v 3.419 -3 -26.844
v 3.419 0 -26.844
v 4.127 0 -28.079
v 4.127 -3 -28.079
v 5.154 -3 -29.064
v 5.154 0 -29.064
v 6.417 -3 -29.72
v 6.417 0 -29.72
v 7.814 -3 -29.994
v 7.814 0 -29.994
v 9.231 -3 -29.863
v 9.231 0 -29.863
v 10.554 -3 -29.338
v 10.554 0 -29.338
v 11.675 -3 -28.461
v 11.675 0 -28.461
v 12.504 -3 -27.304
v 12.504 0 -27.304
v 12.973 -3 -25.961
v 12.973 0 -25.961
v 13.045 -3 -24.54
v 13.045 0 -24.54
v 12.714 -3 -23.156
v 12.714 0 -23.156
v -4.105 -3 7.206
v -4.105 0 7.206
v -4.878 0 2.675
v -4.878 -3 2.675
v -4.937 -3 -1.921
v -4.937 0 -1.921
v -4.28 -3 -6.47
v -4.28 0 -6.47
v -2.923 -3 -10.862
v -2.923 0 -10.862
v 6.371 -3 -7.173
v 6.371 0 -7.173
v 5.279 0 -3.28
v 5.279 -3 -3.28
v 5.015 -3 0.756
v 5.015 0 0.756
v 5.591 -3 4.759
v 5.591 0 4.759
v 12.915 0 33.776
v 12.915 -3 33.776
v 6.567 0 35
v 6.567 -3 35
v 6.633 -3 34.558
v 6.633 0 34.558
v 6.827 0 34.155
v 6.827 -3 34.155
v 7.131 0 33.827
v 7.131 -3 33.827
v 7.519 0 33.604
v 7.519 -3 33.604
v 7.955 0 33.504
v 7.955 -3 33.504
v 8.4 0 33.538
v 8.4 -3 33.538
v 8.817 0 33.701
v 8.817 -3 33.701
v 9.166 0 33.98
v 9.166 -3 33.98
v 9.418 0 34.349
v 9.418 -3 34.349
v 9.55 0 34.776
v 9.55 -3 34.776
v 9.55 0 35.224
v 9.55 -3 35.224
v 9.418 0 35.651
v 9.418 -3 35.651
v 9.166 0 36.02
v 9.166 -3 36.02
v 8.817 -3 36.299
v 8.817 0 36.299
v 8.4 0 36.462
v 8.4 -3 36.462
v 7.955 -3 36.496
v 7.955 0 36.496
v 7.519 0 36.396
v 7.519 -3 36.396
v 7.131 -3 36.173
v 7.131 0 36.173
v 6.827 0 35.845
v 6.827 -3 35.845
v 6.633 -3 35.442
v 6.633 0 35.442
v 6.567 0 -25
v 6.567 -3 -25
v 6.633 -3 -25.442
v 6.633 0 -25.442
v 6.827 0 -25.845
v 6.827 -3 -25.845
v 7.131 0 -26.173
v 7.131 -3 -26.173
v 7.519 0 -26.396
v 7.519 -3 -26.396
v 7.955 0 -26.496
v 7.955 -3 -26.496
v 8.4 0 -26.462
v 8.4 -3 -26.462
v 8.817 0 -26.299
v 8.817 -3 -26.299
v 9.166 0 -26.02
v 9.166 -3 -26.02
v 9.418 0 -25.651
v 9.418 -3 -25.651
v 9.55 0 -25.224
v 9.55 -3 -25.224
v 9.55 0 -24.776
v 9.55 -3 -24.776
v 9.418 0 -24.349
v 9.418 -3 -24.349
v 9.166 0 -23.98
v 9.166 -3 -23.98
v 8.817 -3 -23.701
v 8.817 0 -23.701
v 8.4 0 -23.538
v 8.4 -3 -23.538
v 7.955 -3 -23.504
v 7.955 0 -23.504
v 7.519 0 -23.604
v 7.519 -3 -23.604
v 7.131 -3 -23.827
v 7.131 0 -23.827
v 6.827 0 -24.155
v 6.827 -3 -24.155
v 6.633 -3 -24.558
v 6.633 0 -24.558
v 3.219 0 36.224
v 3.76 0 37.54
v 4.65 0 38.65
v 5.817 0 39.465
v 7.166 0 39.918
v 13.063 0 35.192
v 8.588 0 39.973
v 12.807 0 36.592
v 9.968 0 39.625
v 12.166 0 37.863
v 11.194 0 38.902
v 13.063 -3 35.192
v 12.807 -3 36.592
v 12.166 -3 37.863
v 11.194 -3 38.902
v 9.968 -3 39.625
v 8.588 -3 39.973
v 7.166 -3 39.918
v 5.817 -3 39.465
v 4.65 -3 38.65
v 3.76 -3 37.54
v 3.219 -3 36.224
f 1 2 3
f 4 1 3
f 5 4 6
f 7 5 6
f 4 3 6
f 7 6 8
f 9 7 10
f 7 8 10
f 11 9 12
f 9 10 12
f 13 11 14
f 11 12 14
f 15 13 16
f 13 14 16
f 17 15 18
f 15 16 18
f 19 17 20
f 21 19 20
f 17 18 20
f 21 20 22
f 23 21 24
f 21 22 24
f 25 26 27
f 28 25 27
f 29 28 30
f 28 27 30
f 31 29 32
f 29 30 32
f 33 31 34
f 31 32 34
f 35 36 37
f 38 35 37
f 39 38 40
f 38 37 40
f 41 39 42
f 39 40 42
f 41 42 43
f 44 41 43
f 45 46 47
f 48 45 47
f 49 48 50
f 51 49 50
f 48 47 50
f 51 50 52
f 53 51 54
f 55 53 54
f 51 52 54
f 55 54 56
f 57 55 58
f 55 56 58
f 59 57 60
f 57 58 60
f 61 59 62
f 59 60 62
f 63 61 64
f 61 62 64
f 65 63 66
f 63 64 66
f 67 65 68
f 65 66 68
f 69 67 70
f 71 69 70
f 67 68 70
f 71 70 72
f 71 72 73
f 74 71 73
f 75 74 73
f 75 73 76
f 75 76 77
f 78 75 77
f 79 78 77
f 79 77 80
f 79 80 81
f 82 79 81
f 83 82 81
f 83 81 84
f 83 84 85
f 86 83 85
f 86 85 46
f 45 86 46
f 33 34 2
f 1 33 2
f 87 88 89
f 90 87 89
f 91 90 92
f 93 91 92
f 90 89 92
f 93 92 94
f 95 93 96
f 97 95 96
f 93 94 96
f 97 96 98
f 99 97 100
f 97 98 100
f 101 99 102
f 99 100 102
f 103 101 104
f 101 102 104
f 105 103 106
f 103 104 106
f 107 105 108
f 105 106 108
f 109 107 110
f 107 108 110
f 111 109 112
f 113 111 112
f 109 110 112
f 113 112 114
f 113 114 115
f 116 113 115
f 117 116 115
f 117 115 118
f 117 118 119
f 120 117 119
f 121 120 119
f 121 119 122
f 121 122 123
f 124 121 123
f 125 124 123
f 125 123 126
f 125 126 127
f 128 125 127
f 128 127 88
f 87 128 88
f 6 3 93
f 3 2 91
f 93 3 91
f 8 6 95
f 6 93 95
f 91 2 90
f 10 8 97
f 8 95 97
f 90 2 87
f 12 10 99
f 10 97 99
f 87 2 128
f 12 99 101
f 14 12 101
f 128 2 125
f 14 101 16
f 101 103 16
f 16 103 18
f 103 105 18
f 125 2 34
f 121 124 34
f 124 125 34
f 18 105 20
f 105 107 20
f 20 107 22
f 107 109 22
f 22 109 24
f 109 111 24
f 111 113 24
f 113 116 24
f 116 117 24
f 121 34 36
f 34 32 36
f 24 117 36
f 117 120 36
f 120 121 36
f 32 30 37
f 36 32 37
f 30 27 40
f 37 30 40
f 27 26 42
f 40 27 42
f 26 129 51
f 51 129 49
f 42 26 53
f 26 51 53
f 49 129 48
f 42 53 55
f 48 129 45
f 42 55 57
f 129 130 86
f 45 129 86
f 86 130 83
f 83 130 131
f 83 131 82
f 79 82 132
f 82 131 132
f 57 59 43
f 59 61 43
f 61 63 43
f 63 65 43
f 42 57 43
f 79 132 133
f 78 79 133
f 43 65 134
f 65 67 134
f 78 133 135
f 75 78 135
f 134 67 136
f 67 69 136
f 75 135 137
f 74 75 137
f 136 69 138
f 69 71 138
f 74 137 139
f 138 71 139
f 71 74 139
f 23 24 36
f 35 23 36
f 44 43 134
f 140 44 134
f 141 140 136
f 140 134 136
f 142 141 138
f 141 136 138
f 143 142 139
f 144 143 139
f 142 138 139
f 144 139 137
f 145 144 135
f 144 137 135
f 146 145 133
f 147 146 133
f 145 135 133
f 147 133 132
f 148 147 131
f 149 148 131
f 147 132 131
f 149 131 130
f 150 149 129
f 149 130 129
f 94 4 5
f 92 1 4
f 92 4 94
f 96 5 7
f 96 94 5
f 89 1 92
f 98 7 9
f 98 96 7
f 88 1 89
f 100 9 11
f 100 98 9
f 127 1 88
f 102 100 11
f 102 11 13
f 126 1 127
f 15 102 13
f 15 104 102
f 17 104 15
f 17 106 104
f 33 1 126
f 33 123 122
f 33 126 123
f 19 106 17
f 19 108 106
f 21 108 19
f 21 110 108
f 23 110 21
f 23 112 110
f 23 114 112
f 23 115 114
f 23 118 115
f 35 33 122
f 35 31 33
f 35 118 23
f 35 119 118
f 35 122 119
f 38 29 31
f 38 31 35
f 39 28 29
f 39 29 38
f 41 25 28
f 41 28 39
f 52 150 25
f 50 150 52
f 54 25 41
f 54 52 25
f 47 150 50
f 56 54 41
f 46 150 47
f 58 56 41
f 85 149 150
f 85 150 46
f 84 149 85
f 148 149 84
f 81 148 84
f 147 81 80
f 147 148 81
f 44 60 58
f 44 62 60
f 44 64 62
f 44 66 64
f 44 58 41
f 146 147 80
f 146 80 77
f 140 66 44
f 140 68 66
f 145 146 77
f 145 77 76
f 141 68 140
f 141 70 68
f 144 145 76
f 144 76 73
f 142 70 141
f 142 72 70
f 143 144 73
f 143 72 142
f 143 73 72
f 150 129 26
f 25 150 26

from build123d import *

# Parameters (mm, degrees)
F1_DEPTH = 3
F2_D     = 3


# Not quite as in the source:
# - a feature of the source that left no trace in its solid (it failed there, or was rolled back) is left out


with BuildPart() as f1:
    # F0 (on Front) → F1 (new body)
    with BuildSketch(Plane.XZ):
        with BuildLine():
            ThreePointArc((6.3713843202, -7.1733870463), (5.0414339245, -1.2687792727), (5.5912292227, 4.7587315024))
            Line((5.5912292227, 4.7587315024), (12.9146554895, 33.77647678))
            ThreePointArc((12.9146554895, 33.77647678), (9.290190371, 39.8479883385), (3.2186788125, 36.22352322))
            Line((3.2186788125, 36.22352322), (-4.1047474542, 7.2057779424))
            ThreePointArc((-4.1047474542, 7.2057779424), (-4.9372598224, -1.9212140236), (-2.9234191128, -10.8621035089))
            Line((-2.9234191128, -10.8621035089), (3.4192654345, -26.8443582313))
            ThreePointArc((3.4192654345, -26.8443582313), (9.9110253823, -29.6474017165), (12.7140688675, -23.1556417687))
            Line((12.7140688675, -23.1556417687), (6.3713843202, -7.1733870463))
        make_face()
    extrude(amount=F1_DEPTH)

    # F2 (through all)
    with Locations(Plane(origin=(0, 0, 0), x_dir=(1, 0, 0), z_dir=(0, 1, 0))):
        with Locations((8.066667151, -35), (8.066667151, 25)):
            Hole(F2_D / 2)


solid = f1.part
